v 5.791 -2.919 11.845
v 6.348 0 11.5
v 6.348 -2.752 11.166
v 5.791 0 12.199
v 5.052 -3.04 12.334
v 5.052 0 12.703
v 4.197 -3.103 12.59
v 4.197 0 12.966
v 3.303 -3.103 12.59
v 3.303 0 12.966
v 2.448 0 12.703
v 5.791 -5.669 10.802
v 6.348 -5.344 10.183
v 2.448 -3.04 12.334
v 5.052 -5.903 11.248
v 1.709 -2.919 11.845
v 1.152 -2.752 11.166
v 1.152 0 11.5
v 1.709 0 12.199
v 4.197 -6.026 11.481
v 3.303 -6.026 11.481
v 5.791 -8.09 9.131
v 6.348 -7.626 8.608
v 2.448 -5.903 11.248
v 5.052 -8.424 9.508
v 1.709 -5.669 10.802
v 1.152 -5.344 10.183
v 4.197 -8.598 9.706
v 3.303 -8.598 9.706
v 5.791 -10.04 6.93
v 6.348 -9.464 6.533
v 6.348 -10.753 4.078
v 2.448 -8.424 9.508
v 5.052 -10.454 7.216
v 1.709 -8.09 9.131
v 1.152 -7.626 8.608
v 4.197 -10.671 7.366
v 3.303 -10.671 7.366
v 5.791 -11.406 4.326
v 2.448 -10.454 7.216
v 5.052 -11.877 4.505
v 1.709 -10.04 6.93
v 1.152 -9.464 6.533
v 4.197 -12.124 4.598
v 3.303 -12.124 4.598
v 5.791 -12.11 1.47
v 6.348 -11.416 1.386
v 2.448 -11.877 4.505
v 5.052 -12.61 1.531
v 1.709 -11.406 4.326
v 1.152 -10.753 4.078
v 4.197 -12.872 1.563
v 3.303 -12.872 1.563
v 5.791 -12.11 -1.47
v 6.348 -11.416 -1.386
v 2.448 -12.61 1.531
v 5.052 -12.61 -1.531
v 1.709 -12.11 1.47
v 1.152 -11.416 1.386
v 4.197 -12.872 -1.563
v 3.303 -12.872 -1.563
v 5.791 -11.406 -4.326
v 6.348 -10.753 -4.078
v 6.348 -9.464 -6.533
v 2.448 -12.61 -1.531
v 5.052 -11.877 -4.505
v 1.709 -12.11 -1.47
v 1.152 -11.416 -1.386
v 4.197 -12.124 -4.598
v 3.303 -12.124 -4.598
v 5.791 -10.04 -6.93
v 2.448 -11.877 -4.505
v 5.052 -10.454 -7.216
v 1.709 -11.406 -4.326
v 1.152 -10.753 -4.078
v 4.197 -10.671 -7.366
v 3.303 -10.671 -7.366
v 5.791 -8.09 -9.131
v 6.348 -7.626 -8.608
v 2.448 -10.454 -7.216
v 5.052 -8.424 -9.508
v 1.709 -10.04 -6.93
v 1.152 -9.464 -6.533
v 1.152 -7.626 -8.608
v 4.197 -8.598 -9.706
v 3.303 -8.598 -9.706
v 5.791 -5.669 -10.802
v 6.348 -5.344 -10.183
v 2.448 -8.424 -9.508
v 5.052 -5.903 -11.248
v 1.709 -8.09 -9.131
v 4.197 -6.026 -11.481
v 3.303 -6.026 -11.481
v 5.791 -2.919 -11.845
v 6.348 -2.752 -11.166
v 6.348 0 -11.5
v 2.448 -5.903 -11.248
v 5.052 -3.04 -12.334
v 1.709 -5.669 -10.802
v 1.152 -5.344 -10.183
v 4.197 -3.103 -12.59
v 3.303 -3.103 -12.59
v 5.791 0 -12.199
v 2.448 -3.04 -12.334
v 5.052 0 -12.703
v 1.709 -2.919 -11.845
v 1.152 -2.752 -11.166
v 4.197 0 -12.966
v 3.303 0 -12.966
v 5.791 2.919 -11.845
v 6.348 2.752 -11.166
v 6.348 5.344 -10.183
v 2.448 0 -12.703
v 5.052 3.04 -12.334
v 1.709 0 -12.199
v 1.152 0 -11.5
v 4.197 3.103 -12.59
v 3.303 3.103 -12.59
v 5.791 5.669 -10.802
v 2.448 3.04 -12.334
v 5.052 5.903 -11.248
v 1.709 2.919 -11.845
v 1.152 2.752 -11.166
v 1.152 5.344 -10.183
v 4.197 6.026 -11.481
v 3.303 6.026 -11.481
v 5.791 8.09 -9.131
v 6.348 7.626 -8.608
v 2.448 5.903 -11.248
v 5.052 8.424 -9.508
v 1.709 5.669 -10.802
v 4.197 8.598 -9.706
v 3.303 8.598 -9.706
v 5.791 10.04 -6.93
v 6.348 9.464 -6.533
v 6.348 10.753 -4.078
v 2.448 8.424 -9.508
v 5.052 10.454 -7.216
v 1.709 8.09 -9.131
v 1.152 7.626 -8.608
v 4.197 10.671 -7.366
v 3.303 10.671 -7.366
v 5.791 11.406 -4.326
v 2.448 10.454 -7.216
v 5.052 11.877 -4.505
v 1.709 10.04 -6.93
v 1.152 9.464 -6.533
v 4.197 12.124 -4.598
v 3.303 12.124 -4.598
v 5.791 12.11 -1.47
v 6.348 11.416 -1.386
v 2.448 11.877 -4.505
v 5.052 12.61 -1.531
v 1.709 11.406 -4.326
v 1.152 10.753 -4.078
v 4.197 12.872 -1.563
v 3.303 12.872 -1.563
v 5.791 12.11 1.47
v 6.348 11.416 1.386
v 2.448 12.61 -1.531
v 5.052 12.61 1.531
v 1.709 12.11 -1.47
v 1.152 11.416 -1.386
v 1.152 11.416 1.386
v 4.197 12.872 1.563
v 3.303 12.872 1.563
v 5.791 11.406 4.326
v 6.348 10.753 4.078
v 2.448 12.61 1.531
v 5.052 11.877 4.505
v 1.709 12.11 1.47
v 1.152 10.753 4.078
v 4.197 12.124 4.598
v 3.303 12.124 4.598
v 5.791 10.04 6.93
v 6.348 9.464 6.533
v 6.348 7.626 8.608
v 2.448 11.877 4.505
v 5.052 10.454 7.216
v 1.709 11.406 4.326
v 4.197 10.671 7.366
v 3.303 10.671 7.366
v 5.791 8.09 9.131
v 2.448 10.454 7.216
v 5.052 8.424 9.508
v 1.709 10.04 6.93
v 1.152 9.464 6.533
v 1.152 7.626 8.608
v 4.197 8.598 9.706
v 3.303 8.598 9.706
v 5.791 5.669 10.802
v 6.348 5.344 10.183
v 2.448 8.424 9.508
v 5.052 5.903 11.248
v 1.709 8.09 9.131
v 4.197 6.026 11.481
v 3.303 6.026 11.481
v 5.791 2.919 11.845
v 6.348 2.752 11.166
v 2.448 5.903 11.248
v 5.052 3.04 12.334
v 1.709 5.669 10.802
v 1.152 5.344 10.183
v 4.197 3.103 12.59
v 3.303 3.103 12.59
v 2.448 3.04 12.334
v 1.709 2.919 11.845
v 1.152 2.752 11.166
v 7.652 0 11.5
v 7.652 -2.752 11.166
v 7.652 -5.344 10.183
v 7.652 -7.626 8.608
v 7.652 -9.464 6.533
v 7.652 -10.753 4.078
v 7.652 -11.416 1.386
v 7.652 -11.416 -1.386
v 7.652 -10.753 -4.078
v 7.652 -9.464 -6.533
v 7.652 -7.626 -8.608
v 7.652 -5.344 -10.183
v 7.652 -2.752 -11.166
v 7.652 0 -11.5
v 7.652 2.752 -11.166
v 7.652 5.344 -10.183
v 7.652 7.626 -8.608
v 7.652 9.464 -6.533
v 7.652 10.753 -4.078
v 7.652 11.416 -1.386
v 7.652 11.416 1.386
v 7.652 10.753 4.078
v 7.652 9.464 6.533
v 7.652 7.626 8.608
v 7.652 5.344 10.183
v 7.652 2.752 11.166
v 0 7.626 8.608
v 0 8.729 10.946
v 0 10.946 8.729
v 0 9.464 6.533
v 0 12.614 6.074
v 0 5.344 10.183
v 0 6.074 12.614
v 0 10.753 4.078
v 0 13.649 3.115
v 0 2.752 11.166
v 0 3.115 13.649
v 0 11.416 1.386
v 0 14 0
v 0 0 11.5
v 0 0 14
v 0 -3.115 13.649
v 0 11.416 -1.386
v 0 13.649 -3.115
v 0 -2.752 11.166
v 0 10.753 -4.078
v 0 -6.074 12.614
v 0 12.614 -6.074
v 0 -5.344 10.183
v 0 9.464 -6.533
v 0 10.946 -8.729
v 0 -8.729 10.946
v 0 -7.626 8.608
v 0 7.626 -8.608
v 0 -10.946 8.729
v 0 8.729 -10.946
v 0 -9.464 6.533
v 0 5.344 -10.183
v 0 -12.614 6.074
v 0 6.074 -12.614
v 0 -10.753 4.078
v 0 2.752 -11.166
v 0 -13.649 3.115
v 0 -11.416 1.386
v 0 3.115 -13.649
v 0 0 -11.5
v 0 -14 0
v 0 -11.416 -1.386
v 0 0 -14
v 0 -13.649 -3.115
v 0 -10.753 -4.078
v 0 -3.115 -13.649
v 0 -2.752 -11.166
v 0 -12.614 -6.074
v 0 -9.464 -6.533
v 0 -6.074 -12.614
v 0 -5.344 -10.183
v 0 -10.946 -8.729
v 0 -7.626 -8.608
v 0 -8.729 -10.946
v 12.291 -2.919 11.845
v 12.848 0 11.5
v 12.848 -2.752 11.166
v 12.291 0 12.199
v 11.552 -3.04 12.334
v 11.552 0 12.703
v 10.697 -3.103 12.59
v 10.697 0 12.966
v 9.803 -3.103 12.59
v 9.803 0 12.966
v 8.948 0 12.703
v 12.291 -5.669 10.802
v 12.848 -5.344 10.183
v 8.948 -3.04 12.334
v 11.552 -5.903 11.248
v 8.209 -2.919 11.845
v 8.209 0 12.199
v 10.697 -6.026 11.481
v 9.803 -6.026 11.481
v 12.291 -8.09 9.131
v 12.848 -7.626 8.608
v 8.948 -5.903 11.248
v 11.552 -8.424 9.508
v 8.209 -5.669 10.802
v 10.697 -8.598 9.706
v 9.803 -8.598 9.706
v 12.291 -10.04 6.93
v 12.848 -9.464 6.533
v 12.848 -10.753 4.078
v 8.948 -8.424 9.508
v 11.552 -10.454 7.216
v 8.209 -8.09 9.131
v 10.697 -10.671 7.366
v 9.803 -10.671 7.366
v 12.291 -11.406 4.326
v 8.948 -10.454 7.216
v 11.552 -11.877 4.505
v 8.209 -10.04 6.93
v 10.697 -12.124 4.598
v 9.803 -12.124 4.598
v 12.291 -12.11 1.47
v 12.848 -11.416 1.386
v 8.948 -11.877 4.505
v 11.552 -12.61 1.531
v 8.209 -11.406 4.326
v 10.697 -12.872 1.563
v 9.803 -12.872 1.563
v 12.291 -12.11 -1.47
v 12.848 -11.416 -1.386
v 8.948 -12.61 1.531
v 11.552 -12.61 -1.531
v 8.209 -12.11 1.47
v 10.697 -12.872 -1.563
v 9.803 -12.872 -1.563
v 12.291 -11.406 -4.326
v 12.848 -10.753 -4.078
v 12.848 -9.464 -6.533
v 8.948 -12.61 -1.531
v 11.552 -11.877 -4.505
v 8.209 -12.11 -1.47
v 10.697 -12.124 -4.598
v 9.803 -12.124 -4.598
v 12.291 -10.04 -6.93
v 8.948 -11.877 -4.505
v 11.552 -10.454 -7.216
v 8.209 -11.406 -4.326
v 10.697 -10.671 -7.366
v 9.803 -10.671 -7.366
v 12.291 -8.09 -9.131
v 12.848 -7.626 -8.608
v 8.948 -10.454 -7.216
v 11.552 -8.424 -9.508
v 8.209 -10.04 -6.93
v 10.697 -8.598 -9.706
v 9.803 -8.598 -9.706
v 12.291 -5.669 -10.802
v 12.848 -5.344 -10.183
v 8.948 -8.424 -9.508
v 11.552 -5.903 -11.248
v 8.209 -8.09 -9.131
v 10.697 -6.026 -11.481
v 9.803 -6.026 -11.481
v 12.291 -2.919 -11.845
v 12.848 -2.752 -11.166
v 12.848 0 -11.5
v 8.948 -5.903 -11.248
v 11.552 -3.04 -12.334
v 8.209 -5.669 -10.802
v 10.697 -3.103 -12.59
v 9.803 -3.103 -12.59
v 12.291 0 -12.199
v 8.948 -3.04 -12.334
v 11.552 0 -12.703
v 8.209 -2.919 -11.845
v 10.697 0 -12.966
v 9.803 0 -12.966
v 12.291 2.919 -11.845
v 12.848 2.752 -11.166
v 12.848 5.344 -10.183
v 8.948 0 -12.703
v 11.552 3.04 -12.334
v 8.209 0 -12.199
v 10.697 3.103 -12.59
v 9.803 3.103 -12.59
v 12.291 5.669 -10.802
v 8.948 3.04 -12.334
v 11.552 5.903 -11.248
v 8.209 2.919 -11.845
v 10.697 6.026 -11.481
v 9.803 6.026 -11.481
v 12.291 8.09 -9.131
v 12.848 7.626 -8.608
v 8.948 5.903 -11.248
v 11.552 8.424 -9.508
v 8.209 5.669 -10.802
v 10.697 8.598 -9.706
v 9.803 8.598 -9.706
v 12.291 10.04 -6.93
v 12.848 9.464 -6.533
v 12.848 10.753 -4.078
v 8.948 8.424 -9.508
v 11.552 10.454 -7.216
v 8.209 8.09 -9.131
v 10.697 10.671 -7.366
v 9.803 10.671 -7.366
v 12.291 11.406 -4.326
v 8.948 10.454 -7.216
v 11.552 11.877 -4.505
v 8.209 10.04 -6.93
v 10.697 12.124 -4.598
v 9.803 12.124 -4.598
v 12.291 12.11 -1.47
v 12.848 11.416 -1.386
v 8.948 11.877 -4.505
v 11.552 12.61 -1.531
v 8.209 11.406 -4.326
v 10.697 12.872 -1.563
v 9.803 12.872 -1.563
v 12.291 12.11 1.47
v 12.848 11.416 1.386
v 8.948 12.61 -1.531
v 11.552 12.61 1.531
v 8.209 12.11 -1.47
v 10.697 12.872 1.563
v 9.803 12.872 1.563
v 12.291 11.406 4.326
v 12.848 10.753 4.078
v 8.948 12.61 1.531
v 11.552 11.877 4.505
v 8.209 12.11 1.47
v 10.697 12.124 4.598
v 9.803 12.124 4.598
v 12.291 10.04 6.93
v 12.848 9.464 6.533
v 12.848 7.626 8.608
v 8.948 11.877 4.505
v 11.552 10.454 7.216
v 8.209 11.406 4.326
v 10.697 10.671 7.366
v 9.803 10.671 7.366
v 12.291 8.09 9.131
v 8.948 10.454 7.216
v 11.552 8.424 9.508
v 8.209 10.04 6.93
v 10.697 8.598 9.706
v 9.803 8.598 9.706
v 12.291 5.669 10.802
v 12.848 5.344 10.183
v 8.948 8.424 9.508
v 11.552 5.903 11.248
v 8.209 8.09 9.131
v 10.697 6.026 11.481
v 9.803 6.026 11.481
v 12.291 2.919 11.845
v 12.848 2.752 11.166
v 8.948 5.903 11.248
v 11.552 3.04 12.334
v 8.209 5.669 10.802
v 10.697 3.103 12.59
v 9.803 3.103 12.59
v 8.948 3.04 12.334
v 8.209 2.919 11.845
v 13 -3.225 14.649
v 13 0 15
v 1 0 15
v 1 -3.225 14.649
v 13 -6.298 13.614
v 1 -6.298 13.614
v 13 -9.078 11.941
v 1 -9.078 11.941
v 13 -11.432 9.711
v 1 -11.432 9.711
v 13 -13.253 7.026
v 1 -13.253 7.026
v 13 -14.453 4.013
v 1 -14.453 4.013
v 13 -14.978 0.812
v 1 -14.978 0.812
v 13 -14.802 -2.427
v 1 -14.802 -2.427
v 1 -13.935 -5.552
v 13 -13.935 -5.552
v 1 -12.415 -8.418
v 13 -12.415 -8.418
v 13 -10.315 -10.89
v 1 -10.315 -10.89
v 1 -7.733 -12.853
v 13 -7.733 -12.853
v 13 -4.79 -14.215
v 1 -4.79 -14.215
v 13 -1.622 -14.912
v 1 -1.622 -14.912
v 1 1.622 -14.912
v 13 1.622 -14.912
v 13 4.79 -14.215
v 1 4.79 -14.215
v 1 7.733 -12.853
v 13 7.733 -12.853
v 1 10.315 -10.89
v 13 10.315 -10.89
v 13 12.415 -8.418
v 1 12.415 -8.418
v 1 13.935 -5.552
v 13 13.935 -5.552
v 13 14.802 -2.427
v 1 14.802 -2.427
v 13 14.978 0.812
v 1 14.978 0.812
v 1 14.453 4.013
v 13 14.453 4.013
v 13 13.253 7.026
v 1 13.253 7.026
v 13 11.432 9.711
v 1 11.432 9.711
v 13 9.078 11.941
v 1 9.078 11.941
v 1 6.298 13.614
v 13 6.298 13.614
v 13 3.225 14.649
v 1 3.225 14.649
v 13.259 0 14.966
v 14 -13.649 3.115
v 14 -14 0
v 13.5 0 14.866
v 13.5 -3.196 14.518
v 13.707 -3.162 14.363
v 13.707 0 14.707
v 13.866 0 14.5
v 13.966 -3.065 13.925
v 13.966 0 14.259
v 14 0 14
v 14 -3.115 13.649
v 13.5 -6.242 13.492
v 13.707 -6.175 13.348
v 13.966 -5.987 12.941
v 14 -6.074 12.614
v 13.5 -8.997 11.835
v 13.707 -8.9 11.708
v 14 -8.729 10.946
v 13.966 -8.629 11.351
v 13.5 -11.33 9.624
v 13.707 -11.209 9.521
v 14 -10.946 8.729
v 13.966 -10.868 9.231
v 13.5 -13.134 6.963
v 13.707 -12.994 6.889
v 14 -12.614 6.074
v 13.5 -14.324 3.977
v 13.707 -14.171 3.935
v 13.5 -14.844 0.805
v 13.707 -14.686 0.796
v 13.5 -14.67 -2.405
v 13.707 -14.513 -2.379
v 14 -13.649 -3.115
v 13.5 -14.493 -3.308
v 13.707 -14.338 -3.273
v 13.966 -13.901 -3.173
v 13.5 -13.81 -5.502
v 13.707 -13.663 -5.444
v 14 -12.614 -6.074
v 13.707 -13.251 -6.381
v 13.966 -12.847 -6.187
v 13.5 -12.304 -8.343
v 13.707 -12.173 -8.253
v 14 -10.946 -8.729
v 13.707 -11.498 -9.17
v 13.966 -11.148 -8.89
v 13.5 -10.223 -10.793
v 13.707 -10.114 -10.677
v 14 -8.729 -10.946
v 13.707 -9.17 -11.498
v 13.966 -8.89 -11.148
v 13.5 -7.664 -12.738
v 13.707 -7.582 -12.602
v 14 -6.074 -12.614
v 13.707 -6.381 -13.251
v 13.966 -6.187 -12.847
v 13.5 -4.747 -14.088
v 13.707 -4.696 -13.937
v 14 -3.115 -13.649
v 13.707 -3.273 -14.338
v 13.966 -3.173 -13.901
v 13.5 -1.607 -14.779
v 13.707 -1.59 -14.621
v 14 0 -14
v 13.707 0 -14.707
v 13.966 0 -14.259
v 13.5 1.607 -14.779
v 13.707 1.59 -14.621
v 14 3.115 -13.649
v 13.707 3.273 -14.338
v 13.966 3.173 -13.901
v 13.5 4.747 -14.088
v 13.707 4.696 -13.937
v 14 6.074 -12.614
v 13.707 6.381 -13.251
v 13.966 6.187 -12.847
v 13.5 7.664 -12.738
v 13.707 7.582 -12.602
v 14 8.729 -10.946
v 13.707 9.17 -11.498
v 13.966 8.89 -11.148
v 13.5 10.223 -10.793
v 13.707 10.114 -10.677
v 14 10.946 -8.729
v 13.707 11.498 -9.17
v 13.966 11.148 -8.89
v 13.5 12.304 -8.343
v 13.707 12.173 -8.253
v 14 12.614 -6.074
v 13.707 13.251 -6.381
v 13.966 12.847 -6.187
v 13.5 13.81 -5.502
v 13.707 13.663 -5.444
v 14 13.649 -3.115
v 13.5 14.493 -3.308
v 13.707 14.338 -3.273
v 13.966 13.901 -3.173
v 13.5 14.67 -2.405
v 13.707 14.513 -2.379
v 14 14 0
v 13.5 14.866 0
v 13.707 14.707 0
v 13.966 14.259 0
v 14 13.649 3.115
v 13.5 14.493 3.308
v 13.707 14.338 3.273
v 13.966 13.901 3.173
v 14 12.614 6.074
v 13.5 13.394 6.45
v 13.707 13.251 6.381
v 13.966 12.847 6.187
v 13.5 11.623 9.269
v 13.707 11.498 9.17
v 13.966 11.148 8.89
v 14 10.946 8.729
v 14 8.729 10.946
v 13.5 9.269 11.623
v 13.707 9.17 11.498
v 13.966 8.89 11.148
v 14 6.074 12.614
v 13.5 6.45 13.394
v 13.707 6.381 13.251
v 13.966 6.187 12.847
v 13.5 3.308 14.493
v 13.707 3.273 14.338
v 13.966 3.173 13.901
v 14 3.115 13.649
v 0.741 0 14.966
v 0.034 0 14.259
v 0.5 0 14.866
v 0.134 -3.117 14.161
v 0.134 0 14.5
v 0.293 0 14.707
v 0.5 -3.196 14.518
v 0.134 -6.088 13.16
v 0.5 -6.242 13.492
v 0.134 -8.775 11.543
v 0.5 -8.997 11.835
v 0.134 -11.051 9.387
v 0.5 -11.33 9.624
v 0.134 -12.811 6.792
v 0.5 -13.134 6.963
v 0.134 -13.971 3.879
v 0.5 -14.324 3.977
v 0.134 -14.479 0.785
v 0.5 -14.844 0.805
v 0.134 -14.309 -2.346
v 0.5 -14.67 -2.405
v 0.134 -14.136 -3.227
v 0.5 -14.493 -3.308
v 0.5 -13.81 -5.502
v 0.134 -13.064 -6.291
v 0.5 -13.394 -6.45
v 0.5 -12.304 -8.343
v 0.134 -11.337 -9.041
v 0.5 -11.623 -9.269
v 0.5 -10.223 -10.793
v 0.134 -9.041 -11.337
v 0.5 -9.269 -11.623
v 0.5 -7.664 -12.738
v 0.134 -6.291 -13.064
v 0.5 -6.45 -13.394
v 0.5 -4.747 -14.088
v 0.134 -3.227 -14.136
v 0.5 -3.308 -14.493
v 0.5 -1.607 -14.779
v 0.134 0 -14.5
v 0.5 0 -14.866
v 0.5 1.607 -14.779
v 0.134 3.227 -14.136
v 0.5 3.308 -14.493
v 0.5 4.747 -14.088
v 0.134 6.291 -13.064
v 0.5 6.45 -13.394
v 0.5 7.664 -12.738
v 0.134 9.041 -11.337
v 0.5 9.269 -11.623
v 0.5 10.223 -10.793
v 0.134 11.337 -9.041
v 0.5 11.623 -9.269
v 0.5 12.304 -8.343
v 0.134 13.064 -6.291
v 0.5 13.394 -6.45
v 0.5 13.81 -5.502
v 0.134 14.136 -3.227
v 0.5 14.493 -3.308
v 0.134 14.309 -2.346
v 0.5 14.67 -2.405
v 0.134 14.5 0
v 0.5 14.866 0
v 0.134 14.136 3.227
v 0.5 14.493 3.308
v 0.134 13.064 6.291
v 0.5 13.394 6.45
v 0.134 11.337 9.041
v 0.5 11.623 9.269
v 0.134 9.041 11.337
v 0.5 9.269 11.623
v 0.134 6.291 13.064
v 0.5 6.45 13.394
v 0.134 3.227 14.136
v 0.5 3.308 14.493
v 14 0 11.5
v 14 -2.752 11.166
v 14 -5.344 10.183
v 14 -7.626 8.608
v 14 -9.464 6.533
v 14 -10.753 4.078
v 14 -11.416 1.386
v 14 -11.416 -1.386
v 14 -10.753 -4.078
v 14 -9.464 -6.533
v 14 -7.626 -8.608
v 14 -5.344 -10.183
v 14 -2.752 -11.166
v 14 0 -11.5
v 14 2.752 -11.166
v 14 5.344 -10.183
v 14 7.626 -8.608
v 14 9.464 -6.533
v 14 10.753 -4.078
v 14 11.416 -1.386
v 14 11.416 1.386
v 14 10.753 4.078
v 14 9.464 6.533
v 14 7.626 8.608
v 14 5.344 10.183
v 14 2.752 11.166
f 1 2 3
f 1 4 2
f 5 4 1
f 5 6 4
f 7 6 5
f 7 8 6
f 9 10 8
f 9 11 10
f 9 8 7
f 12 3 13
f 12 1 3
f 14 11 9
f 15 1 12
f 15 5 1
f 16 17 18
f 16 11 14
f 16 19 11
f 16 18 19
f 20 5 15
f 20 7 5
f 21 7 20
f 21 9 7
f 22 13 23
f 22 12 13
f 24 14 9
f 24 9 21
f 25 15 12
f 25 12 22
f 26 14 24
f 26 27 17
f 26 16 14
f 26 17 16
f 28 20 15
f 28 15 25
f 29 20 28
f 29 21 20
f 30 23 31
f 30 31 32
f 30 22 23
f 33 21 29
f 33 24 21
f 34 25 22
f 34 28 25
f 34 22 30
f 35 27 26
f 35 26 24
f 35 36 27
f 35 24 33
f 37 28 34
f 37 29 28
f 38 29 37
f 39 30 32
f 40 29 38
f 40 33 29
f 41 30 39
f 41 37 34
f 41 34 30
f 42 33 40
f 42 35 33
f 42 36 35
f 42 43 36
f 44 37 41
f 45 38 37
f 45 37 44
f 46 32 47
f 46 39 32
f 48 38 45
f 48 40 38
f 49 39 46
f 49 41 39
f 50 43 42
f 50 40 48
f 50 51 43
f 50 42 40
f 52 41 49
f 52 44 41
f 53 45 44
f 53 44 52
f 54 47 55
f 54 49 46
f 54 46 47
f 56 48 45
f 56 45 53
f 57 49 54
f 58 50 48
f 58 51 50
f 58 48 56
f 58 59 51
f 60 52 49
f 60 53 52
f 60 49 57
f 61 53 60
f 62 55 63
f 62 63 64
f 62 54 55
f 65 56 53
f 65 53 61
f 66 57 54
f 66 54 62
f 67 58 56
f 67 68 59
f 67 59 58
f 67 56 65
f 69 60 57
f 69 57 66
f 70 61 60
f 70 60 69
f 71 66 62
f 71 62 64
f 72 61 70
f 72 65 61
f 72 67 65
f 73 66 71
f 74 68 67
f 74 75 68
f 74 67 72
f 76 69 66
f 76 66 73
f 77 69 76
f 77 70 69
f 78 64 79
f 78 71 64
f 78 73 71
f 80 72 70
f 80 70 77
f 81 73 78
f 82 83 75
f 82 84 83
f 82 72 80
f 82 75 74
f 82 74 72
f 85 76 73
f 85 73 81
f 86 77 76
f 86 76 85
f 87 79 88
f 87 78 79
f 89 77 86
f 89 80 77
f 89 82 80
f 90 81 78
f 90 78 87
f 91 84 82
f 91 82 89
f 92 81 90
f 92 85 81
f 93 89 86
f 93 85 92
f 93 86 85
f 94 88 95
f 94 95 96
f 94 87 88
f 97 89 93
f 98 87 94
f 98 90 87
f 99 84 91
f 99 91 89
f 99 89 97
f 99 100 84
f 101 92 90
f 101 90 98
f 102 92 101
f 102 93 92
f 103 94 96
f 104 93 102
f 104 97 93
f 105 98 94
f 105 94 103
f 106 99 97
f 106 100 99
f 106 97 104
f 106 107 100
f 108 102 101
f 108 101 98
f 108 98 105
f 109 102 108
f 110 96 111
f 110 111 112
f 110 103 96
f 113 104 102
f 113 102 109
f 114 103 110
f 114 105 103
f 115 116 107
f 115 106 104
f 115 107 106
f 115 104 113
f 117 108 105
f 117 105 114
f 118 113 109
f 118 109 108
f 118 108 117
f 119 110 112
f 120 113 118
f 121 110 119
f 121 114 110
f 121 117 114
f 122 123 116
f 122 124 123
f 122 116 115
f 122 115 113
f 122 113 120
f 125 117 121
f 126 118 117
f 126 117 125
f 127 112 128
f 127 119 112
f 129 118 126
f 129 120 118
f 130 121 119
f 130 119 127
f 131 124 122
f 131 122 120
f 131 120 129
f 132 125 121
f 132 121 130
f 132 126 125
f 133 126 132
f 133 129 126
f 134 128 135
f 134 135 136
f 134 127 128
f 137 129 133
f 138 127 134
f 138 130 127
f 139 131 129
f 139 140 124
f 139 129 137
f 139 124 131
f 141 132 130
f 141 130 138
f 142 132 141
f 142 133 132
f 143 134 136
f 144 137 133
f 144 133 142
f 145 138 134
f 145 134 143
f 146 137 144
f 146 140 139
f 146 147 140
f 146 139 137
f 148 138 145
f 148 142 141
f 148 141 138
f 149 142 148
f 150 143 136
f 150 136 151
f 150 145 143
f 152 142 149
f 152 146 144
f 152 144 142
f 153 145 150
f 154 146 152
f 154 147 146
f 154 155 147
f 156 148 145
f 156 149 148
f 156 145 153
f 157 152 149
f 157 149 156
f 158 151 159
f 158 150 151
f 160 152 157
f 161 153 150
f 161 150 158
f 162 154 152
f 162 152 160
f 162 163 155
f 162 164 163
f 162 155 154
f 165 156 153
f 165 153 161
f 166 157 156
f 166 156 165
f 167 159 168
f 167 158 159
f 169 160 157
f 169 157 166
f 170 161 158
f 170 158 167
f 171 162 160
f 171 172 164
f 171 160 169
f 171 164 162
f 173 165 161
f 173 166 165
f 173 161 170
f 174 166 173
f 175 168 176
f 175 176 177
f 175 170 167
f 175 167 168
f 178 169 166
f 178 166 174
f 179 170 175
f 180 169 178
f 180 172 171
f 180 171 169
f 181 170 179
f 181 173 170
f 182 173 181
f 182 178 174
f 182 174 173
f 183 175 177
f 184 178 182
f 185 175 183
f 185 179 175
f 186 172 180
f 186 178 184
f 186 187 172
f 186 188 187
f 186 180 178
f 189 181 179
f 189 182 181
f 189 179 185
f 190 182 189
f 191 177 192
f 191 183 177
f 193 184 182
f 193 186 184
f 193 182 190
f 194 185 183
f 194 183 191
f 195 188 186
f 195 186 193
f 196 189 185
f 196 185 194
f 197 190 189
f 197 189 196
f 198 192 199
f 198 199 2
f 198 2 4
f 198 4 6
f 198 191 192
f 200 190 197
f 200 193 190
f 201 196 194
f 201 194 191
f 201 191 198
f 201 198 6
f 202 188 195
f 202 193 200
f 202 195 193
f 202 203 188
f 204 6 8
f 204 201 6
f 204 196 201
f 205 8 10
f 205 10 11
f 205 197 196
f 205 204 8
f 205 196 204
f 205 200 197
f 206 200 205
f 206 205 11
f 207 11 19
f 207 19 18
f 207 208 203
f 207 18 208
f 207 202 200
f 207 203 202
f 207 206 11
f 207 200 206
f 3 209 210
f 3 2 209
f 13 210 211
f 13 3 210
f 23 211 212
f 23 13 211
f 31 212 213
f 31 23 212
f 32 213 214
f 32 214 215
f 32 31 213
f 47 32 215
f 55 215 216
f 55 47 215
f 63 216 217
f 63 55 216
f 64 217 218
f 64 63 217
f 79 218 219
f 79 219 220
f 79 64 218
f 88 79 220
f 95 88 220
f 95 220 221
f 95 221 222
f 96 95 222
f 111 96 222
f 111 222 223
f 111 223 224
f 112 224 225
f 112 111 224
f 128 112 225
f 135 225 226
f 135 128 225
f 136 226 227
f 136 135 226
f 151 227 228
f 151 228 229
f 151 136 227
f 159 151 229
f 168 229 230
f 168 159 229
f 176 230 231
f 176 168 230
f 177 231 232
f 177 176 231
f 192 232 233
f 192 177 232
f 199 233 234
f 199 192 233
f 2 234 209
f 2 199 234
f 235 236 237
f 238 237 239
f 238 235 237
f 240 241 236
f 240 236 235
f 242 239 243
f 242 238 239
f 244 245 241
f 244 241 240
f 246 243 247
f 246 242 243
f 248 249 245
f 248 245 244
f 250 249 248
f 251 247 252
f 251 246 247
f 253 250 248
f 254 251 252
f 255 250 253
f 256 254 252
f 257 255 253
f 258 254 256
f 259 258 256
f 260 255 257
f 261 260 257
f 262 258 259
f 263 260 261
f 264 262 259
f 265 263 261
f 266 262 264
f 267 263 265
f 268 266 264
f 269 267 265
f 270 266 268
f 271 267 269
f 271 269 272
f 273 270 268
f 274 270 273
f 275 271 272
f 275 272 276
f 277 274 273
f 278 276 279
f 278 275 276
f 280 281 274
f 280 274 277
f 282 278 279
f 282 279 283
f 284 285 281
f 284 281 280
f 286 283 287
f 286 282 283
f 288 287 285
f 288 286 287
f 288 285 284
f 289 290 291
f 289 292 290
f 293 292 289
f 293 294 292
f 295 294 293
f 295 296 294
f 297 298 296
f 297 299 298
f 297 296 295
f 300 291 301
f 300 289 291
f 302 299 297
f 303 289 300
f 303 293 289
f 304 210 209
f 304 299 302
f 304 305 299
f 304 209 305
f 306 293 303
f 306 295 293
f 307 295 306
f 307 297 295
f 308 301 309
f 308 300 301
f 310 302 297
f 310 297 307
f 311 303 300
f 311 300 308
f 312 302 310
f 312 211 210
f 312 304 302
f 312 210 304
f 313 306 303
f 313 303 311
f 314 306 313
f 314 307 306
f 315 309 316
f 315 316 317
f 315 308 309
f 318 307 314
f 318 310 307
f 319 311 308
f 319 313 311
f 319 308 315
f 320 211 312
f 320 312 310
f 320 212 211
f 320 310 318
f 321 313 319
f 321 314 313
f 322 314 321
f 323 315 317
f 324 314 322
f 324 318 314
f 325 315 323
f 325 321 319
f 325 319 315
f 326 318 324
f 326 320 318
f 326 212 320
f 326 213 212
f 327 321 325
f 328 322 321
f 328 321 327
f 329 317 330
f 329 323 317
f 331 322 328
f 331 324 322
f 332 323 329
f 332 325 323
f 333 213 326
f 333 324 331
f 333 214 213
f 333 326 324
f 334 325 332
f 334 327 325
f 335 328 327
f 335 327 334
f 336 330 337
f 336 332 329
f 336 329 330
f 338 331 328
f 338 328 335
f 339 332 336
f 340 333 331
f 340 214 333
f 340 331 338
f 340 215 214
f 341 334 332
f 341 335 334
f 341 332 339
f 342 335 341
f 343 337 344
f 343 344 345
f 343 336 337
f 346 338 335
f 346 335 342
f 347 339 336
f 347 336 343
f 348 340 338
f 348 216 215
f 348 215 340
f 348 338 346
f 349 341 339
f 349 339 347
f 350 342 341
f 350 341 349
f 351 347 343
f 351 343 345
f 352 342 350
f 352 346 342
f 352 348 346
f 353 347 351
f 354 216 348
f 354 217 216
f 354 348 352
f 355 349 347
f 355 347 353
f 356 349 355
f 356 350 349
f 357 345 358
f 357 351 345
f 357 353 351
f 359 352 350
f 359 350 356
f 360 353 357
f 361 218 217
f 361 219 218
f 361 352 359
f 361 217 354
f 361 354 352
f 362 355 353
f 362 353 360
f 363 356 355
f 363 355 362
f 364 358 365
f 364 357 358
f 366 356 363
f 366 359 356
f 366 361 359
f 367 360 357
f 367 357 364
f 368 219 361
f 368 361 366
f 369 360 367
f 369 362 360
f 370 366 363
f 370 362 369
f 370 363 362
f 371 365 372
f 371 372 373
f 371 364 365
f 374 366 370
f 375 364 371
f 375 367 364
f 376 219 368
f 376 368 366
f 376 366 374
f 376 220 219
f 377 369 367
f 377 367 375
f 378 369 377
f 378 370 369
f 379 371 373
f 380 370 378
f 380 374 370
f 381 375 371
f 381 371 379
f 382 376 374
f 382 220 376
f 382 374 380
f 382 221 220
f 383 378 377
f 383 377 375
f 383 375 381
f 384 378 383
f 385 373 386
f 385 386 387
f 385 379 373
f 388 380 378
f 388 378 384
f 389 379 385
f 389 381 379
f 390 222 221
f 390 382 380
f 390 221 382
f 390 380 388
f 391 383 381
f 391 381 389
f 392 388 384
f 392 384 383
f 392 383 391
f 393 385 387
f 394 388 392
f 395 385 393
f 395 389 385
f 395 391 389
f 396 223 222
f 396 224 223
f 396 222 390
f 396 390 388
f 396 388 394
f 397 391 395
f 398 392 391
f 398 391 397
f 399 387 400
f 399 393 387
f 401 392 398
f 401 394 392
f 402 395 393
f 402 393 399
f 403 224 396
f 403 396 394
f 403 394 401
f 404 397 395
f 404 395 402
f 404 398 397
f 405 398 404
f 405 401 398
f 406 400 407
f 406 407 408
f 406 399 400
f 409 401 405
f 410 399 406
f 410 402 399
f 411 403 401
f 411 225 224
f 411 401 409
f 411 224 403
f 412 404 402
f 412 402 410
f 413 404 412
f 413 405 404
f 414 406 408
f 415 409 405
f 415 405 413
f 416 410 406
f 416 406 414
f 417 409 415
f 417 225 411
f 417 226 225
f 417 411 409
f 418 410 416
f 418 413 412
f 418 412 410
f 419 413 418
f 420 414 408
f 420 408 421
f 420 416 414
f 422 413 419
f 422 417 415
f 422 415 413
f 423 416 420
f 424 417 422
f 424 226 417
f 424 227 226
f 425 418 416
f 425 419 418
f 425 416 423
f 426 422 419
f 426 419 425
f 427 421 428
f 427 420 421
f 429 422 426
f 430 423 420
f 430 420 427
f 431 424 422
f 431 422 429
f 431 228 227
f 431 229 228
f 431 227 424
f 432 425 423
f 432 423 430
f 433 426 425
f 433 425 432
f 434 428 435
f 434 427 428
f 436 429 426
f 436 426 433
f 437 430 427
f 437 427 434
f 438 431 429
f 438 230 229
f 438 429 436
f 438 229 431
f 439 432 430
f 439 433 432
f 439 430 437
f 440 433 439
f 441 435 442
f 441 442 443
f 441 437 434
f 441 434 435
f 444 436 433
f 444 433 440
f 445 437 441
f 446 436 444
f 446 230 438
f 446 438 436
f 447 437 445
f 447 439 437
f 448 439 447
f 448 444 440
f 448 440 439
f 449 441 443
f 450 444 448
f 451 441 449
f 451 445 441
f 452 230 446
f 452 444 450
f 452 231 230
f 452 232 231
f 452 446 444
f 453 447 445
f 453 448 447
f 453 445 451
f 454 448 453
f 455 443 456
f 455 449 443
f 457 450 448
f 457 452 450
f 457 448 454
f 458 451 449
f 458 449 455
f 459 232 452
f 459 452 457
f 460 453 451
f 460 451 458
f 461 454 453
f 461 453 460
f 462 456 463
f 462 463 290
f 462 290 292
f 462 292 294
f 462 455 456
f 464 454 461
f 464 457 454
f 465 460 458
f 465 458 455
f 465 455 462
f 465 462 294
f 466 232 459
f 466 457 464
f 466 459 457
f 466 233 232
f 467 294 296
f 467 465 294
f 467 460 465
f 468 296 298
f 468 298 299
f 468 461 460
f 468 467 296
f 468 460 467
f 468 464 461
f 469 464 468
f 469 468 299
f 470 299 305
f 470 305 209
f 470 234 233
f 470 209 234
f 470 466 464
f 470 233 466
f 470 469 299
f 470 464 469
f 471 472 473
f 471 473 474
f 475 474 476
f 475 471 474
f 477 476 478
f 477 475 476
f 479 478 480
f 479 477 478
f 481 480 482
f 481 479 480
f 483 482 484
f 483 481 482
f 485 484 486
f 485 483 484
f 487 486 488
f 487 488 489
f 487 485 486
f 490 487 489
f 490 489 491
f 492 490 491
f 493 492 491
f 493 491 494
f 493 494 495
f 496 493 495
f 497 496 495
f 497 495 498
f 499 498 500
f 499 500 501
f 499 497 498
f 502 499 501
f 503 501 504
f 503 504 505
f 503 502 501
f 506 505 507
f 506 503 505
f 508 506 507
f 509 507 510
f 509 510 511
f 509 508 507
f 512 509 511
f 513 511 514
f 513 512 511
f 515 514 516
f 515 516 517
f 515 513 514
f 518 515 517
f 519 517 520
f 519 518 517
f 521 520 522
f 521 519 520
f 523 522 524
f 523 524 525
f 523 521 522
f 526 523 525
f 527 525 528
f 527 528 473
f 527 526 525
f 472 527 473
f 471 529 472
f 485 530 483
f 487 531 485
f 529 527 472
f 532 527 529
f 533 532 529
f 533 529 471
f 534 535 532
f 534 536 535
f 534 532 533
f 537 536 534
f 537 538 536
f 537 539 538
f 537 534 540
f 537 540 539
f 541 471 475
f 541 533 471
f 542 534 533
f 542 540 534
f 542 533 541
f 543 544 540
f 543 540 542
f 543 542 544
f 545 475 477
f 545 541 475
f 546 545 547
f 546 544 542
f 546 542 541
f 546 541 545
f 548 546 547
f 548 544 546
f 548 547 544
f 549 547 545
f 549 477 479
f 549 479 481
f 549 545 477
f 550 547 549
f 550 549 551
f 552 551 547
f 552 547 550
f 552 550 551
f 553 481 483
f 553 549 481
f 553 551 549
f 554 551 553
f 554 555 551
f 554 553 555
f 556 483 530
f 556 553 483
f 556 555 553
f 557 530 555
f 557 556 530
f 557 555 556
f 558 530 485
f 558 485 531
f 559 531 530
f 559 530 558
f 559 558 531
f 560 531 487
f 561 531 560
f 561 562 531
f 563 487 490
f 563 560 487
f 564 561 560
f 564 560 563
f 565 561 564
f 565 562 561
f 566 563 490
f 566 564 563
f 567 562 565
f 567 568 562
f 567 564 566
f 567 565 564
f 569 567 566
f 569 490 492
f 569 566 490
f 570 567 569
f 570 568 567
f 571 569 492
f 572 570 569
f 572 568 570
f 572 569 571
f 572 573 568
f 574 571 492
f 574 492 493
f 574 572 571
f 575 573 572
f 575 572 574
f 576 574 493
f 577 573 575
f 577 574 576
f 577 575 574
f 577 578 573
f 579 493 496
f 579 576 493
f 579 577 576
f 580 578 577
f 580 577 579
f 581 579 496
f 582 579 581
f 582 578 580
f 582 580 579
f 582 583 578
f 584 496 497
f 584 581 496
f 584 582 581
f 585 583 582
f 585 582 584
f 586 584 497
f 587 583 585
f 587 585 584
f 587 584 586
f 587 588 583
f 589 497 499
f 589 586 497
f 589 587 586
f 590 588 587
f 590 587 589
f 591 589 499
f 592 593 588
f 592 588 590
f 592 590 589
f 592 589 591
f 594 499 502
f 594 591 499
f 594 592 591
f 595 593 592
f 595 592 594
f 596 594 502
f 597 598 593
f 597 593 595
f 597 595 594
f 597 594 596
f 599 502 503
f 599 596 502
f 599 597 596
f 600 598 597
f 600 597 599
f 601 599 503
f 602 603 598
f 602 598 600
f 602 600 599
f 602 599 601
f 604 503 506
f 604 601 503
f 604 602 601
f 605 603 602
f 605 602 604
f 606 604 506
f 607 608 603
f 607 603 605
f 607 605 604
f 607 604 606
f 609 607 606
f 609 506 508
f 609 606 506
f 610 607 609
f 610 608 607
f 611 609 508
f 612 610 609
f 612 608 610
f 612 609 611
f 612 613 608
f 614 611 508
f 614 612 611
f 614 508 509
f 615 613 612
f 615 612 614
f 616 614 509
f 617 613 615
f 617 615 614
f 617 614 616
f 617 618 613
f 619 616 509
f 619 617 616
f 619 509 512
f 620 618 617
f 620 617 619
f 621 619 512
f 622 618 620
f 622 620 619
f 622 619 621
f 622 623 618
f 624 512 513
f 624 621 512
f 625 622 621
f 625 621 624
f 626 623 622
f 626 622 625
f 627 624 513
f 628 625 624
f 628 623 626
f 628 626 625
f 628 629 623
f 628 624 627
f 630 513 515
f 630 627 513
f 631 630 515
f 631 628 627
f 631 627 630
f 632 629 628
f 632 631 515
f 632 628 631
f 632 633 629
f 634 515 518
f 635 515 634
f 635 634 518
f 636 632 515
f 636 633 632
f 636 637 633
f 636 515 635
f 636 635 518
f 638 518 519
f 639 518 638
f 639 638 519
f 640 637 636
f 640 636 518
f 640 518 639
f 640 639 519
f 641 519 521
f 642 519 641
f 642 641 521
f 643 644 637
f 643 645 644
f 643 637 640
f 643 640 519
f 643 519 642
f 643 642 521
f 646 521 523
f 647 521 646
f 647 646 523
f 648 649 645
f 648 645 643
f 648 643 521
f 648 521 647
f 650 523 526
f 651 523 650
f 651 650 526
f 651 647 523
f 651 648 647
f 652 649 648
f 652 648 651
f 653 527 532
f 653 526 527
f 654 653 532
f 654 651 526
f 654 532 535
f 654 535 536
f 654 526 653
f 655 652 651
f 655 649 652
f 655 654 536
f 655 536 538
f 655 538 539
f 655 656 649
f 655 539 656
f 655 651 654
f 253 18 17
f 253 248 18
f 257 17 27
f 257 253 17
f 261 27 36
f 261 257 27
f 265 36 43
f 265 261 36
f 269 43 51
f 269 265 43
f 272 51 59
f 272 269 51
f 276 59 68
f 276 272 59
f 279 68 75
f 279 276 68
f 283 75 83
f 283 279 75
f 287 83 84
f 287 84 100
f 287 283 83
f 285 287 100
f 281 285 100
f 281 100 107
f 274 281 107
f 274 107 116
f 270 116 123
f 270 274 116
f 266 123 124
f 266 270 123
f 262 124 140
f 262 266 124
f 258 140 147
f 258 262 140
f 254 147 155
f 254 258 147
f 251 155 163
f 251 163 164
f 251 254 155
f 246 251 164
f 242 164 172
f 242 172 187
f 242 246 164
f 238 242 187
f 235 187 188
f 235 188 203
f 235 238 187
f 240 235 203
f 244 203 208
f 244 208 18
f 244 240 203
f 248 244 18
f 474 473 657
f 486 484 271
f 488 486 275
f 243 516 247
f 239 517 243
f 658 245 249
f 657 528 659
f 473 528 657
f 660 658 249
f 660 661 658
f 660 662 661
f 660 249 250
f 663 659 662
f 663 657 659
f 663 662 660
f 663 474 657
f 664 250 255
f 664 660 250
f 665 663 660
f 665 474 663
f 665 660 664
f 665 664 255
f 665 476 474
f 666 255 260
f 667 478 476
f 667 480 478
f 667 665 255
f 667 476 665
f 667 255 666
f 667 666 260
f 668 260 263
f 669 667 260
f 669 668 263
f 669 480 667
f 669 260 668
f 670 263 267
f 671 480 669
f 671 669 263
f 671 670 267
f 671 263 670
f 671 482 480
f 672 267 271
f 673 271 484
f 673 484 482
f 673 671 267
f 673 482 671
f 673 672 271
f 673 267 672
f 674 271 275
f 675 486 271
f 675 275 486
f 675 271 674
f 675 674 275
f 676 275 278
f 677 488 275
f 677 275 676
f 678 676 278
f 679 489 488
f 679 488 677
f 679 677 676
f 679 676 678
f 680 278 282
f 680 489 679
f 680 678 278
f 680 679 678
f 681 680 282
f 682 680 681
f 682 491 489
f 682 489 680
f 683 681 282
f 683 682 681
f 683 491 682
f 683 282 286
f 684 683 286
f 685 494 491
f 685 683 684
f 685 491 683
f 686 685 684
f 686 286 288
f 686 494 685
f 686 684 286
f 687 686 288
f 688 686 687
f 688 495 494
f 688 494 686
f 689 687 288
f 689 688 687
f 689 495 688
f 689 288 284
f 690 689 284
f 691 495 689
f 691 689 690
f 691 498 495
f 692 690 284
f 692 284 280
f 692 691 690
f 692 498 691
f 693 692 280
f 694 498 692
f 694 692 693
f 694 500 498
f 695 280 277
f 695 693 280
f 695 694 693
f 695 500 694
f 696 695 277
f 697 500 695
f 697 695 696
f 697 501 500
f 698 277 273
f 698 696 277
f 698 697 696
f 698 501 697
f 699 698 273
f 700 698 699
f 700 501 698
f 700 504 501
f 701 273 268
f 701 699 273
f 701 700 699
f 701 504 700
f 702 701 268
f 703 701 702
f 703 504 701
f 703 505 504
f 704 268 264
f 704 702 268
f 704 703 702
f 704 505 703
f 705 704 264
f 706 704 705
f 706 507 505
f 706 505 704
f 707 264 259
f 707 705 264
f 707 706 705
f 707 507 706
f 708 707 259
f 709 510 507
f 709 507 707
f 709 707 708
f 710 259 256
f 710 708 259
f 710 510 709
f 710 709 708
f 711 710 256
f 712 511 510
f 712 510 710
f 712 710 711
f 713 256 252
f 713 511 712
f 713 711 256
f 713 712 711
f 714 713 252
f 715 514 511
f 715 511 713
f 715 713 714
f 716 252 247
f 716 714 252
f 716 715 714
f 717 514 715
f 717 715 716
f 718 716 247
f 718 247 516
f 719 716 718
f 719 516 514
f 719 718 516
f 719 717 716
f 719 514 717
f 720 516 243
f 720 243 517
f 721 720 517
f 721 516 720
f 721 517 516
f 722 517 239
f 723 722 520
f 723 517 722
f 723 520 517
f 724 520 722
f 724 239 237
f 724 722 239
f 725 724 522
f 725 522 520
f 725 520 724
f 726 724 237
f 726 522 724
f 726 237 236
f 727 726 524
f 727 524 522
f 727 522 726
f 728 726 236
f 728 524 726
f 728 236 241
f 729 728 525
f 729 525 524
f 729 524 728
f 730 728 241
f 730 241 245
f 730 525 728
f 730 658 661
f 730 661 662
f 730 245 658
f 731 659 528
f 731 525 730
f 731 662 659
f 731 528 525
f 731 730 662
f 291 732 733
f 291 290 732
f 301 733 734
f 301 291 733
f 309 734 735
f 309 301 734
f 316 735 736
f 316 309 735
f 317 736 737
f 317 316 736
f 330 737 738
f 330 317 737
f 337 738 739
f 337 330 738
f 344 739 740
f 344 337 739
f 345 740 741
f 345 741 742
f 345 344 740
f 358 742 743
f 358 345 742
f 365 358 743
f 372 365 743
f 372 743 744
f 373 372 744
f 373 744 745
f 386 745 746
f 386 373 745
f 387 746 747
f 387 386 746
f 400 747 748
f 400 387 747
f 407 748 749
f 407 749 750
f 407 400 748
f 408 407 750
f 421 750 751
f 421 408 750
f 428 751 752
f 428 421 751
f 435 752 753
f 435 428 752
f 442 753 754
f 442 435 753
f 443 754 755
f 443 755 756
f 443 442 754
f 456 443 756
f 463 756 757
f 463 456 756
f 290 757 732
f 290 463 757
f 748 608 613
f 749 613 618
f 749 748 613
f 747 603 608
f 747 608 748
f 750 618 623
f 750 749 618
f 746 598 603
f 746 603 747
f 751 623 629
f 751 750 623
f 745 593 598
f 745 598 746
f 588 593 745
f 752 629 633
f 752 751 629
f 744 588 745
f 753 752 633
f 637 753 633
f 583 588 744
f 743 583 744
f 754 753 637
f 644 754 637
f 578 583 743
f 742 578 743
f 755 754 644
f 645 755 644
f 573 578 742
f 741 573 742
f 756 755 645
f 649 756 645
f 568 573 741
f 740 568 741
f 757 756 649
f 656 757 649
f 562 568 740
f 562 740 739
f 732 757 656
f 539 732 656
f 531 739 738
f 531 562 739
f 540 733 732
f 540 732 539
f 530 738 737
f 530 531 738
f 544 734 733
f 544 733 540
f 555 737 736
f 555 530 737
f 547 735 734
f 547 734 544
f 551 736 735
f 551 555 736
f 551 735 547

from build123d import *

# Parameters (mm, degrees)
CONG_1_R = 1


with BuildPart() as part:
    # Esquisse1 → Base-Révolution (revolve)
    with BuildSketch(Plane.XY, mode=Mode.PRIVATE) as base_r_volution_sk:
        with BuildLine():
            Line((0, 11.5), (0, 15))
            Line((0, 15), (14, 15))
            Line((14, 15), (14, 11.5))
            Line((14, 11.5), (12.848076211, 11.5))
            ThreePointArc((12.848076211, 11.5), (10.25, 13), (7.651923789, 11.5))
            Line((7.651923789, 11.5), (6.348076211, 11.5))
            ThreePointArc((6.348076211, 11.5), (3.75, 13), (1.151923789, 11.5))
            Line((1.151923789, 11.5), (0, 11.5))
        make_face()
    revolve(base_r_volution_sk.sketch.rotate(Axis((0, 0, 0), (1, 0, 0)), 90), axis=Axis((0, 0, 0), (1, 0, 0)))

    # Congé1
    cong_1_edges = [part.edges().sort_by_distance(p)[0] for p in [
        (0, 0, -15),
        (14, 0, -15),
    ]]
    fillet(cong_1_edges, radius=CONG_1_R)


solid = part.part
